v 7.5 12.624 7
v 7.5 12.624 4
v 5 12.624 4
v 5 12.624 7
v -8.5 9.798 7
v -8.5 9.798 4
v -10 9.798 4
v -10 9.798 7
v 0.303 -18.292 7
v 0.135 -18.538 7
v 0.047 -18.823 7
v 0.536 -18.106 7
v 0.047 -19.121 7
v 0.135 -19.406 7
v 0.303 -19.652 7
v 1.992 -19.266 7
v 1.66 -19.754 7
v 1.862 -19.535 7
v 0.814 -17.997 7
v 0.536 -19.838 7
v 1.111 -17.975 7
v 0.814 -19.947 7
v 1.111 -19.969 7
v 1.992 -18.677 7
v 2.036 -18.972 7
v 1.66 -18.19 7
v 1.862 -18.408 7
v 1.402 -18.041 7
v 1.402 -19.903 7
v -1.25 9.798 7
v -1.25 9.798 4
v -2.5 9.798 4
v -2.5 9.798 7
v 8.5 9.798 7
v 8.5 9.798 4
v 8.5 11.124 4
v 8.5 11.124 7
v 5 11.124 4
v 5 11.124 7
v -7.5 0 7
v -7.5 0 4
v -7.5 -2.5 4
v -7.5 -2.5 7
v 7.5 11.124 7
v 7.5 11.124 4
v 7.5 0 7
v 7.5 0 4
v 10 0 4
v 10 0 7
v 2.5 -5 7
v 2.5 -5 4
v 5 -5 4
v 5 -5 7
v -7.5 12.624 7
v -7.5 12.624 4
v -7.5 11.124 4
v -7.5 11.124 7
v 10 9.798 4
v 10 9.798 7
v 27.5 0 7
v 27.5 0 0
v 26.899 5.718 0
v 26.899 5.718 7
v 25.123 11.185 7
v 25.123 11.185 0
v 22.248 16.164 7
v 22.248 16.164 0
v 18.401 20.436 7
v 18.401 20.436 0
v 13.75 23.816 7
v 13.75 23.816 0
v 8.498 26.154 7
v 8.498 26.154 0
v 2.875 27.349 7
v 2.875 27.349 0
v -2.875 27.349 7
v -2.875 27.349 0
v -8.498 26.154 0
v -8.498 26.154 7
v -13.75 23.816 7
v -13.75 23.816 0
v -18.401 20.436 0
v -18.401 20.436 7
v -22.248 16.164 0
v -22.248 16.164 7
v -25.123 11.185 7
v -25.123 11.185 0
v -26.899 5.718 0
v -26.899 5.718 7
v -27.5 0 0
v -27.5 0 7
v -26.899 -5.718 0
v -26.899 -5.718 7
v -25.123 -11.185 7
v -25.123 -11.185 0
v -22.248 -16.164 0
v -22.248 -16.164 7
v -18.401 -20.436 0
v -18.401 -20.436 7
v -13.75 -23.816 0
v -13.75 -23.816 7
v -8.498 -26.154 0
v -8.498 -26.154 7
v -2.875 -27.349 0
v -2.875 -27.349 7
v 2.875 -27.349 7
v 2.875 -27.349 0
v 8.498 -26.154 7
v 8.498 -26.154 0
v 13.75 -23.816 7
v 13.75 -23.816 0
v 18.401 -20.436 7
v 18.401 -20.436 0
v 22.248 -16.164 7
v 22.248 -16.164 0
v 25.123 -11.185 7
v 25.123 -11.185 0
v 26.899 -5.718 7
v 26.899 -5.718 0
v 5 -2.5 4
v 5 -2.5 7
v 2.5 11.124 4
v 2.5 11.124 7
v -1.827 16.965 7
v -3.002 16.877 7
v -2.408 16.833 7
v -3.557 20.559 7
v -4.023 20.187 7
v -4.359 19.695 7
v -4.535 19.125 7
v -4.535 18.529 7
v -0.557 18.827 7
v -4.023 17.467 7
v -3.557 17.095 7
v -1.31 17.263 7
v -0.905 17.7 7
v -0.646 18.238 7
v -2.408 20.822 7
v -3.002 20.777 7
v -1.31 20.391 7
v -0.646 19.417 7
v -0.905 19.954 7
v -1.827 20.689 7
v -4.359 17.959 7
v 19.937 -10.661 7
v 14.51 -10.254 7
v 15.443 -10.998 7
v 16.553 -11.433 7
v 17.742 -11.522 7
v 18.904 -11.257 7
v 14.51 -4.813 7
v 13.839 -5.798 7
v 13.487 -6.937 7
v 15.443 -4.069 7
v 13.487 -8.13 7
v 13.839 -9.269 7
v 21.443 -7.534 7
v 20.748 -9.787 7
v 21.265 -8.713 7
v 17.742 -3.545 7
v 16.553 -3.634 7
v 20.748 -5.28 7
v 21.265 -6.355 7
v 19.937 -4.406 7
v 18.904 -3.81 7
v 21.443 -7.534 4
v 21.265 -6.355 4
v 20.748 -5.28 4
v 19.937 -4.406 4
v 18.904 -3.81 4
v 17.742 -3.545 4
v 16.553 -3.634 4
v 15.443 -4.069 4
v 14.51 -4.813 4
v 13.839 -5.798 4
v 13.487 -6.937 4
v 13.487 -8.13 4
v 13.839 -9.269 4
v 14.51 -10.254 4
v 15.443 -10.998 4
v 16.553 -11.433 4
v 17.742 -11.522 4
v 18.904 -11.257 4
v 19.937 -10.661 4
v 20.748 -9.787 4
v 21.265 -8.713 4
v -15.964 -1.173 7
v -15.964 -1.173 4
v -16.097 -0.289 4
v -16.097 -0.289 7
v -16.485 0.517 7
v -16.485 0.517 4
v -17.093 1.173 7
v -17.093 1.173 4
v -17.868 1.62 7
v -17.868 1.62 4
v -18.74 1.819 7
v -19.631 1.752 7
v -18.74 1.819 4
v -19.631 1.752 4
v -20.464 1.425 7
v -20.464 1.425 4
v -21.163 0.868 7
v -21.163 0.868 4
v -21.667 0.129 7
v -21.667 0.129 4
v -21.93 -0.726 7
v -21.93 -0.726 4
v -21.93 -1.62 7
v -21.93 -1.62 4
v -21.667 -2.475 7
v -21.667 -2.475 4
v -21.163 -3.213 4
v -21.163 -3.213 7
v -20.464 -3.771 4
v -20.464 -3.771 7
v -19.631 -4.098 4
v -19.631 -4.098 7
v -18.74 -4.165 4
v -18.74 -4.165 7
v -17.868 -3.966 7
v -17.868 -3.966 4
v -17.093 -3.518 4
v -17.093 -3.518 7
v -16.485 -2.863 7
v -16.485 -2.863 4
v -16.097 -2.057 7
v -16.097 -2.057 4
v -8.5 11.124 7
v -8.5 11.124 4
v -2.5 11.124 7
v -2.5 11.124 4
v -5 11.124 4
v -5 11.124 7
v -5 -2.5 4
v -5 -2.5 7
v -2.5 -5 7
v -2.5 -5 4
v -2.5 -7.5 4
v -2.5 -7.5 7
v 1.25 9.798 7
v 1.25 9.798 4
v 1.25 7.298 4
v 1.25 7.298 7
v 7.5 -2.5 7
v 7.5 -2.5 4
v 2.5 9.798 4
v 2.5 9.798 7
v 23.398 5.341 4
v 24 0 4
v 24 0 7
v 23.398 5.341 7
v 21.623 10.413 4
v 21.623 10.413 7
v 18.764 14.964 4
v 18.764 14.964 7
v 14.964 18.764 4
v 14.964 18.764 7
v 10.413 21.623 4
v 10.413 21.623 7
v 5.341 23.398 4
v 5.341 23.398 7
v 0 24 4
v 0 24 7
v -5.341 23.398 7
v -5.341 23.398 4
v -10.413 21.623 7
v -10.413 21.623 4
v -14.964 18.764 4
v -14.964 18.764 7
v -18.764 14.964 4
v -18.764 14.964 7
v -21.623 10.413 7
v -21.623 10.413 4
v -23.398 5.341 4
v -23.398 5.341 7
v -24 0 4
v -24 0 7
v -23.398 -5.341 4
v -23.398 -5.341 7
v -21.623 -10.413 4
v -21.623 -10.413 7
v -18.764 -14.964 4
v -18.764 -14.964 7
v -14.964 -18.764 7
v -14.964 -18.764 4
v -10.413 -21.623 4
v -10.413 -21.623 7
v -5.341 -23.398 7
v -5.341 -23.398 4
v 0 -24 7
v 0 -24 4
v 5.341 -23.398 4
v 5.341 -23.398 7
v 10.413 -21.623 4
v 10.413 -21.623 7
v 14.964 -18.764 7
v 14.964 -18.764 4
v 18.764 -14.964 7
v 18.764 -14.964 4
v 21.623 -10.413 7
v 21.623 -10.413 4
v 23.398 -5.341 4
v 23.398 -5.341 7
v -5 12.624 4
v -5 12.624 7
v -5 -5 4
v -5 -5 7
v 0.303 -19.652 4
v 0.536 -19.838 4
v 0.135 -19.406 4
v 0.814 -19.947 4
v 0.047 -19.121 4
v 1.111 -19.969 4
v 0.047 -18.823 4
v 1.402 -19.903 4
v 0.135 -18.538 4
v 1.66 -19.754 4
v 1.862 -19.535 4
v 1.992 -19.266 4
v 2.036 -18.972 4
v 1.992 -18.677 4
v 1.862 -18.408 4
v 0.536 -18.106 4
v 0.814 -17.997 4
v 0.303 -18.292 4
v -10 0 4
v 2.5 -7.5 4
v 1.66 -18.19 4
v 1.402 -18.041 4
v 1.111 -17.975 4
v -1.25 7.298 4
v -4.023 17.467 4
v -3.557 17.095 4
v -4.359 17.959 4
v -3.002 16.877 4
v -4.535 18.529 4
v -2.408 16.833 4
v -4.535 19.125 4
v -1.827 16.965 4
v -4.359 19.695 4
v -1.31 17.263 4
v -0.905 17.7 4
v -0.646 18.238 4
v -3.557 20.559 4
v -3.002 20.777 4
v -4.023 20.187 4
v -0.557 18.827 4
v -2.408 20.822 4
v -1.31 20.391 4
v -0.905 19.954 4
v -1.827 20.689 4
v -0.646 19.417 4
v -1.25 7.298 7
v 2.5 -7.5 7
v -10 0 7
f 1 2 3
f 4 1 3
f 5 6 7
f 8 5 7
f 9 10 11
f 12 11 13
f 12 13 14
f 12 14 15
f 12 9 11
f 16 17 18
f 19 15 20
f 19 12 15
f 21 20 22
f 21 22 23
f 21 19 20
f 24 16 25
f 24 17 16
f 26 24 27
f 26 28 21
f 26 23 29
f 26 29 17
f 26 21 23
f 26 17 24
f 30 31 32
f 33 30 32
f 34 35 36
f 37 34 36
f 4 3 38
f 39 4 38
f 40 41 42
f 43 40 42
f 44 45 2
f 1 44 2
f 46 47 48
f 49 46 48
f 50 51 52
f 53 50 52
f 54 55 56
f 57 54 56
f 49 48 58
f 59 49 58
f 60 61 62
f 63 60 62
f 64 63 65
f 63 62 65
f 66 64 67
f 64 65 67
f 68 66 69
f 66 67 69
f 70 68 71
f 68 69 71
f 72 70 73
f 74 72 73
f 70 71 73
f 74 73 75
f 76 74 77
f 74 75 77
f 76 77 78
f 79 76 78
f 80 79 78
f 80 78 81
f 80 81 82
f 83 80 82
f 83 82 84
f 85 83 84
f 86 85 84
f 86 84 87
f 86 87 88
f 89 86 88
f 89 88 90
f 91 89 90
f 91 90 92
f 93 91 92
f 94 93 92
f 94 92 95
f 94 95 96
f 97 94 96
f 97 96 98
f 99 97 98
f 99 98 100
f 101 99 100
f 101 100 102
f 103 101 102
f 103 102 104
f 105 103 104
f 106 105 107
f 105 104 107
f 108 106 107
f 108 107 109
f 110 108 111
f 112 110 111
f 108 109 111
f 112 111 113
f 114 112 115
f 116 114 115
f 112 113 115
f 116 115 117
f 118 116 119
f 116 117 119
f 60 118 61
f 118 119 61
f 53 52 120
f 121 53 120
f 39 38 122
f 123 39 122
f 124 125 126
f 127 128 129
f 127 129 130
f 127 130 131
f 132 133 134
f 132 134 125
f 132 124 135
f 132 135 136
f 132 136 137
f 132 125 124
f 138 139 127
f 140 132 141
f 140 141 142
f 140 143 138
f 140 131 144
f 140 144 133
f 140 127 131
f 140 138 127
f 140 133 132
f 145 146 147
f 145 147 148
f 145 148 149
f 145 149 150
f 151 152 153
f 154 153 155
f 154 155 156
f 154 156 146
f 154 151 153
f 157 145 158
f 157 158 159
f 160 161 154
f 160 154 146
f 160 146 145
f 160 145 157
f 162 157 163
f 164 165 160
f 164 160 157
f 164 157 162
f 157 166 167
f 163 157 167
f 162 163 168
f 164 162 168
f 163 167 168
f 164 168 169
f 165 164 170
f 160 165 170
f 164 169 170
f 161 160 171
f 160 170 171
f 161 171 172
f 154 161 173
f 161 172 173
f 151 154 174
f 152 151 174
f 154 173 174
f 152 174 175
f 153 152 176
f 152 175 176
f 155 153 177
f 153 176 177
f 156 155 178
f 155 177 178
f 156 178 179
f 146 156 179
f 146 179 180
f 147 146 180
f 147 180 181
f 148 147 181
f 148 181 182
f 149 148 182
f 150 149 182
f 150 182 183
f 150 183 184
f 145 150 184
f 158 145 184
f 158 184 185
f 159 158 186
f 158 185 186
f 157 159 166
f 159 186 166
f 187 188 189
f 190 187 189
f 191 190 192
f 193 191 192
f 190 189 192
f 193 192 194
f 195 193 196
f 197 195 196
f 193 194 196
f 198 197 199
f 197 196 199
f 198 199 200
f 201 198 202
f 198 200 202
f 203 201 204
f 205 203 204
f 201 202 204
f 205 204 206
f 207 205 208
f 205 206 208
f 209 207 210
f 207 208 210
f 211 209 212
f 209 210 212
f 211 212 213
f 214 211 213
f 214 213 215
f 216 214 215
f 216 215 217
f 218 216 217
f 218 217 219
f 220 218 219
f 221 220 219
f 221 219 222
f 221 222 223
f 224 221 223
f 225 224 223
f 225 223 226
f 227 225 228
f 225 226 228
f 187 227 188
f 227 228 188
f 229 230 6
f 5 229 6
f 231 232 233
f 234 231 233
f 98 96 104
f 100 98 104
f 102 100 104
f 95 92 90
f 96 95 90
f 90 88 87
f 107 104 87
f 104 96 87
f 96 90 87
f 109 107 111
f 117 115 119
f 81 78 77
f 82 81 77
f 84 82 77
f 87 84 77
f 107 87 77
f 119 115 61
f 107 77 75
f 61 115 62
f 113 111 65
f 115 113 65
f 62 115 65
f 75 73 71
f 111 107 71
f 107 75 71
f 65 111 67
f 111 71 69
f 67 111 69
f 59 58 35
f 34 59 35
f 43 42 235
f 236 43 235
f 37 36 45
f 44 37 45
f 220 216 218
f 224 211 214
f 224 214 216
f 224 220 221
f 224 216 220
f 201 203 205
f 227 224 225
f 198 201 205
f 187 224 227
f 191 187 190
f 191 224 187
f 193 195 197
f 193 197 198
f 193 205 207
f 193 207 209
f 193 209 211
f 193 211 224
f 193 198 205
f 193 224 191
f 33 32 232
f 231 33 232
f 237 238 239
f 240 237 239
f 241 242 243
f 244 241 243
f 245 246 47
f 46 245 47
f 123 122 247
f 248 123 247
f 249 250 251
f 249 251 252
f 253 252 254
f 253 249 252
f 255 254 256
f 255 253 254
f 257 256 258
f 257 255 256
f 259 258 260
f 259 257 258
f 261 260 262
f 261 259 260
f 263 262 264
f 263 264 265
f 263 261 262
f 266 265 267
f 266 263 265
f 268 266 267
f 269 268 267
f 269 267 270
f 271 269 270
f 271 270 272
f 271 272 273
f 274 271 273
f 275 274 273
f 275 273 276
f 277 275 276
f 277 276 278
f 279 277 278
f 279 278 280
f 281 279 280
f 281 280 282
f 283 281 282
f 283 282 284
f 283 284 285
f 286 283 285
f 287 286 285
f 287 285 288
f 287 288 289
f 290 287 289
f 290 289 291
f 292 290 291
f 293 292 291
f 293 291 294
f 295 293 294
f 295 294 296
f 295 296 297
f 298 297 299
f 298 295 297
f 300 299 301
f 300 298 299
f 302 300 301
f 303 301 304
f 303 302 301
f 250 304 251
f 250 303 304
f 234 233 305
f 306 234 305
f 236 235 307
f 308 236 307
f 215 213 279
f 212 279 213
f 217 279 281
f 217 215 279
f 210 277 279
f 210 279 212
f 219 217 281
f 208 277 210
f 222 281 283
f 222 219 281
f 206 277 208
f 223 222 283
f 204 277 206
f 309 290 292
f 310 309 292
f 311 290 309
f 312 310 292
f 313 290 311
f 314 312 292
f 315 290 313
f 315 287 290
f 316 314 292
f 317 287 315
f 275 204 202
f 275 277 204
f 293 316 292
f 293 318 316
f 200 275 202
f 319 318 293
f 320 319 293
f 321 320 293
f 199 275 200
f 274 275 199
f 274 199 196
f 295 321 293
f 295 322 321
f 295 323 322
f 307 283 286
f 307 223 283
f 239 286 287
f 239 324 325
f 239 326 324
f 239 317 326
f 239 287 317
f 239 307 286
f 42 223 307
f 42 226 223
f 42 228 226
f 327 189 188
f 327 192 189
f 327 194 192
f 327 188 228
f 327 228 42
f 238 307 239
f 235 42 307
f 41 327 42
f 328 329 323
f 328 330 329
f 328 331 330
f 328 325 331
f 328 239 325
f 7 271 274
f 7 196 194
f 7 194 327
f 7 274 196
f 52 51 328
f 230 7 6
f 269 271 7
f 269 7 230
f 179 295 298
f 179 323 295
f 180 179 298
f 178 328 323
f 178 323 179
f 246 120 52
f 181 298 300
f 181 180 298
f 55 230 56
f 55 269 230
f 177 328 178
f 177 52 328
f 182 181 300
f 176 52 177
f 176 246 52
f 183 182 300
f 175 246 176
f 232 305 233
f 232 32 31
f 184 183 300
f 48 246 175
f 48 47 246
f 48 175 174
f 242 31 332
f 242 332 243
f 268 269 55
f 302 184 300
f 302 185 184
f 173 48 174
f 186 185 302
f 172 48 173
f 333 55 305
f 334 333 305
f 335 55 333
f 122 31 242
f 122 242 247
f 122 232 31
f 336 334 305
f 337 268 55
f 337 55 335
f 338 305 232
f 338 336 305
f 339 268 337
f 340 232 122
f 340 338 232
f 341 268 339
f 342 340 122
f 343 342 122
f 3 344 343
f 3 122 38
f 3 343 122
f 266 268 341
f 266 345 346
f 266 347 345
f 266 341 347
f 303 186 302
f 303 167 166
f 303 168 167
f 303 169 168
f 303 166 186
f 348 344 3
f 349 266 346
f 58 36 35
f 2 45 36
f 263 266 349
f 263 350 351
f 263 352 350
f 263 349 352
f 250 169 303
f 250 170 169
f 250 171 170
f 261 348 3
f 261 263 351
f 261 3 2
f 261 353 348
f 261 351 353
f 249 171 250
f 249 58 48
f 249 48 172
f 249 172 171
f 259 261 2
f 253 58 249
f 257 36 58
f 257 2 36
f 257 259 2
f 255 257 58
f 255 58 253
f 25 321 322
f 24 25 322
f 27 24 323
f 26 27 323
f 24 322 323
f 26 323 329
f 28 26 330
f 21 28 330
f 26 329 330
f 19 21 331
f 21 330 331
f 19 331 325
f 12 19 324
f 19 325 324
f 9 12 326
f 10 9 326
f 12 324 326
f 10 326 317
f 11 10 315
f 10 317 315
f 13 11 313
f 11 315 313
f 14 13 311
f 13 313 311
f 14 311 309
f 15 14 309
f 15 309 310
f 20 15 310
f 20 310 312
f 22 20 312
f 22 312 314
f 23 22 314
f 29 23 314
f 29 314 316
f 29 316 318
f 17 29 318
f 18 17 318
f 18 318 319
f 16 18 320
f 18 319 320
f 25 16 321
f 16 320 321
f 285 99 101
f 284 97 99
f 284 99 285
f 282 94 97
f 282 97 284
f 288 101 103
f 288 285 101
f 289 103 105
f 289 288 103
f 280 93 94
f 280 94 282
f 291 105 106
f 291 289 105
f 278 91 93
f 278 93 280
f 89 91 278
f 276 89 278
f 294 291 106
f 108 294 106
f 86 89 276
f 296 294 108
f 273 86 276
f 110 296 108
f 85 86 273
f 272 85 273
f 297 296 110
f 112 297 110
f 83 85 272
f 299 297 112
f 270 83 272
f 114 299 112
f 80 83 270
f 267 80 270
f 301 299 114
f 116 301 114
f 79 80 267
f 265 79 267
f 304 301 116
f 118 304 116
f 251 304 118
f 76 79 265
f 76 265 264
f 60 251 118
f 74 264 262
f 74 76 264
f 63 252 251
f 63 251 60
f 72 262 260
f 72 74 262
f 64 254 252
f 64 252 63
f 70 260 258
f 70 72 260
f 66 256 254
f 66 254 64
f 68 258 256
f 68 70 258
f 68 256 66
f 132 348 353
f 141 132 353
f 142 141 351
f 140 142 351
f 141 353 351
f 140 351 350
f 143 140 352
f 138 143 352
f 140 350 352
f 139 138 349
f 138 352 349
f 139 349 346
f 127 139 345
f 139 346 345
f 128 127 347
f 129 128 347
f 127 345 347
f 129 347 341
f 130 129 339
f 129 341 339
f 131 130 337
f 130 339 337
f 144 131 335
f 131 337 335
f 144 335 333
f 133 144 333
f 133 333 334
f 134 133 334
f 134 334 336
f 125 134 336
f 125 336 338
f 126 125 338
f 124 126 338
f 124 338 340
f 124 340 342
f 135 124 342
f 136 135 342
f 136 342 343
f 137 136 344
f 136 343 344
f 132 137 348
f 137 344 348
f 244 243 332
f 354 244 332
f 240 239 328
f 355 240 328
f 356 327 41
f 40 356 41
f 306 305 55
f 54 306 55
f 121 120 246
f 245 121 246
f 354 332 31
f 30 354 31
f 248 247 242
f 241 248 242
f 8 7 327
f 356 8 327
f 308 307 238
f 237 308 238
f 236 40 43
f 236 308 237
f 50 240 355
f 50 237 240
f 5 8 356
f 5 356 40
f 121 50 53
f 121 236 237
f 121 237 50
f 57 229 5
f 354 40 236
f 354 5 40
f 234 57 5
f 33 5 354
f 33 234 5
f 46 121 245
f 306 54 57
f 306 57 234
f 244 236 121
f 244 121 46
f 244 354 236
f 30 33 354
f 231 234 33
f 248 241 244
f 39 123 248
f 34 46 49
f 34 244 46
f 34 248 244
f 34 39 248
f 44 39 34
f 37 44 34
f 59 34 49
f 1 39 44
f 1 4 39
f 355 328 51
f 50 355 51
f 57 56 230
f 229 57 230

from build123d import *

# Parameters (mm, degrees)
F0_R     = 27.5
F0_R_2   = 24
F1_DEPTH = 7
F2_R     = 27.5
F3_DEPTH = 4
F4_R     = 3
F4_R_2   = 1
F4_R_3   = 4
F4_R_4   = 2
F5_DEPTH = 3
F7_DEPTH = 7


with BuildPart() as f1:
    # F0 (on Top) → F1 (new body)
    with BuildSketch(Plane.XY):
        Circle(F0_R)
        Circle(F0_R_2, mode=Mode.SUBTRACT)
    extrude(amount=F1_DEPTH)

    # F2 (on Top) → F3 (join)
    with BuildSketch(Plane.XY):
        Circle(F2_R)
    extrude(amount=F3_DEPTH)

    # F4 (on face) → F5 (join)
    with BuildSketch(Plane.XY.offset(4)):
        with Locations((-18.963763, -1.172897)):
            Circle(F4_R)
        with Locations((1.036237, -18.971721)):
            Circle(F4_R_2)
        with Locations((17.442618, -7.533598)):
            Circle(F4_R_3)
        with Locations((-2.557382, 18.827103)):
            Circle(F4_R_4)
    extrude(amount=F5_DEPTH)

    # F6 (on Top) → F7 (join)
    with BuildSketch(Plane.XY):
        Polygon((-2.5, -7.5), (0, -7.5), (2.5, -7.5), (2.5, -5), (5, -5), (5, -2.5), (7.5, -2.5), (7.5, 0), (10, 0), (10, 9.797959), (8.5, 9.797959), (8.5, 11.124298), (7.5, 11.124298), (7.5, 12.624298), (5, 12.624298), (5, 11.124298), (2.5, 11.124298), (2.5, 9.797959), (1.25, 9.797959), (1.25, 7.297959), (0, 7.297959), (-1.25, 7.297959), (-1.25, 9.797959), (-2.5, 9.797959), (-2.5, 11.124298), (-5, 11.124298), (-5, 12.624298), (-7.5, 12.624298), (-7.5, 11.124298), (-8.5, 11.124298), (-8.5, 9.797959), (-10, 9.797959), (-10, 0), (-7.5, 0), (-7.5, -2.5), (-5, -2.5), (-5, -5), (-2.5, -5), align=None)
    extrude(amount=F7_DEPTH)


solid = f1.part
